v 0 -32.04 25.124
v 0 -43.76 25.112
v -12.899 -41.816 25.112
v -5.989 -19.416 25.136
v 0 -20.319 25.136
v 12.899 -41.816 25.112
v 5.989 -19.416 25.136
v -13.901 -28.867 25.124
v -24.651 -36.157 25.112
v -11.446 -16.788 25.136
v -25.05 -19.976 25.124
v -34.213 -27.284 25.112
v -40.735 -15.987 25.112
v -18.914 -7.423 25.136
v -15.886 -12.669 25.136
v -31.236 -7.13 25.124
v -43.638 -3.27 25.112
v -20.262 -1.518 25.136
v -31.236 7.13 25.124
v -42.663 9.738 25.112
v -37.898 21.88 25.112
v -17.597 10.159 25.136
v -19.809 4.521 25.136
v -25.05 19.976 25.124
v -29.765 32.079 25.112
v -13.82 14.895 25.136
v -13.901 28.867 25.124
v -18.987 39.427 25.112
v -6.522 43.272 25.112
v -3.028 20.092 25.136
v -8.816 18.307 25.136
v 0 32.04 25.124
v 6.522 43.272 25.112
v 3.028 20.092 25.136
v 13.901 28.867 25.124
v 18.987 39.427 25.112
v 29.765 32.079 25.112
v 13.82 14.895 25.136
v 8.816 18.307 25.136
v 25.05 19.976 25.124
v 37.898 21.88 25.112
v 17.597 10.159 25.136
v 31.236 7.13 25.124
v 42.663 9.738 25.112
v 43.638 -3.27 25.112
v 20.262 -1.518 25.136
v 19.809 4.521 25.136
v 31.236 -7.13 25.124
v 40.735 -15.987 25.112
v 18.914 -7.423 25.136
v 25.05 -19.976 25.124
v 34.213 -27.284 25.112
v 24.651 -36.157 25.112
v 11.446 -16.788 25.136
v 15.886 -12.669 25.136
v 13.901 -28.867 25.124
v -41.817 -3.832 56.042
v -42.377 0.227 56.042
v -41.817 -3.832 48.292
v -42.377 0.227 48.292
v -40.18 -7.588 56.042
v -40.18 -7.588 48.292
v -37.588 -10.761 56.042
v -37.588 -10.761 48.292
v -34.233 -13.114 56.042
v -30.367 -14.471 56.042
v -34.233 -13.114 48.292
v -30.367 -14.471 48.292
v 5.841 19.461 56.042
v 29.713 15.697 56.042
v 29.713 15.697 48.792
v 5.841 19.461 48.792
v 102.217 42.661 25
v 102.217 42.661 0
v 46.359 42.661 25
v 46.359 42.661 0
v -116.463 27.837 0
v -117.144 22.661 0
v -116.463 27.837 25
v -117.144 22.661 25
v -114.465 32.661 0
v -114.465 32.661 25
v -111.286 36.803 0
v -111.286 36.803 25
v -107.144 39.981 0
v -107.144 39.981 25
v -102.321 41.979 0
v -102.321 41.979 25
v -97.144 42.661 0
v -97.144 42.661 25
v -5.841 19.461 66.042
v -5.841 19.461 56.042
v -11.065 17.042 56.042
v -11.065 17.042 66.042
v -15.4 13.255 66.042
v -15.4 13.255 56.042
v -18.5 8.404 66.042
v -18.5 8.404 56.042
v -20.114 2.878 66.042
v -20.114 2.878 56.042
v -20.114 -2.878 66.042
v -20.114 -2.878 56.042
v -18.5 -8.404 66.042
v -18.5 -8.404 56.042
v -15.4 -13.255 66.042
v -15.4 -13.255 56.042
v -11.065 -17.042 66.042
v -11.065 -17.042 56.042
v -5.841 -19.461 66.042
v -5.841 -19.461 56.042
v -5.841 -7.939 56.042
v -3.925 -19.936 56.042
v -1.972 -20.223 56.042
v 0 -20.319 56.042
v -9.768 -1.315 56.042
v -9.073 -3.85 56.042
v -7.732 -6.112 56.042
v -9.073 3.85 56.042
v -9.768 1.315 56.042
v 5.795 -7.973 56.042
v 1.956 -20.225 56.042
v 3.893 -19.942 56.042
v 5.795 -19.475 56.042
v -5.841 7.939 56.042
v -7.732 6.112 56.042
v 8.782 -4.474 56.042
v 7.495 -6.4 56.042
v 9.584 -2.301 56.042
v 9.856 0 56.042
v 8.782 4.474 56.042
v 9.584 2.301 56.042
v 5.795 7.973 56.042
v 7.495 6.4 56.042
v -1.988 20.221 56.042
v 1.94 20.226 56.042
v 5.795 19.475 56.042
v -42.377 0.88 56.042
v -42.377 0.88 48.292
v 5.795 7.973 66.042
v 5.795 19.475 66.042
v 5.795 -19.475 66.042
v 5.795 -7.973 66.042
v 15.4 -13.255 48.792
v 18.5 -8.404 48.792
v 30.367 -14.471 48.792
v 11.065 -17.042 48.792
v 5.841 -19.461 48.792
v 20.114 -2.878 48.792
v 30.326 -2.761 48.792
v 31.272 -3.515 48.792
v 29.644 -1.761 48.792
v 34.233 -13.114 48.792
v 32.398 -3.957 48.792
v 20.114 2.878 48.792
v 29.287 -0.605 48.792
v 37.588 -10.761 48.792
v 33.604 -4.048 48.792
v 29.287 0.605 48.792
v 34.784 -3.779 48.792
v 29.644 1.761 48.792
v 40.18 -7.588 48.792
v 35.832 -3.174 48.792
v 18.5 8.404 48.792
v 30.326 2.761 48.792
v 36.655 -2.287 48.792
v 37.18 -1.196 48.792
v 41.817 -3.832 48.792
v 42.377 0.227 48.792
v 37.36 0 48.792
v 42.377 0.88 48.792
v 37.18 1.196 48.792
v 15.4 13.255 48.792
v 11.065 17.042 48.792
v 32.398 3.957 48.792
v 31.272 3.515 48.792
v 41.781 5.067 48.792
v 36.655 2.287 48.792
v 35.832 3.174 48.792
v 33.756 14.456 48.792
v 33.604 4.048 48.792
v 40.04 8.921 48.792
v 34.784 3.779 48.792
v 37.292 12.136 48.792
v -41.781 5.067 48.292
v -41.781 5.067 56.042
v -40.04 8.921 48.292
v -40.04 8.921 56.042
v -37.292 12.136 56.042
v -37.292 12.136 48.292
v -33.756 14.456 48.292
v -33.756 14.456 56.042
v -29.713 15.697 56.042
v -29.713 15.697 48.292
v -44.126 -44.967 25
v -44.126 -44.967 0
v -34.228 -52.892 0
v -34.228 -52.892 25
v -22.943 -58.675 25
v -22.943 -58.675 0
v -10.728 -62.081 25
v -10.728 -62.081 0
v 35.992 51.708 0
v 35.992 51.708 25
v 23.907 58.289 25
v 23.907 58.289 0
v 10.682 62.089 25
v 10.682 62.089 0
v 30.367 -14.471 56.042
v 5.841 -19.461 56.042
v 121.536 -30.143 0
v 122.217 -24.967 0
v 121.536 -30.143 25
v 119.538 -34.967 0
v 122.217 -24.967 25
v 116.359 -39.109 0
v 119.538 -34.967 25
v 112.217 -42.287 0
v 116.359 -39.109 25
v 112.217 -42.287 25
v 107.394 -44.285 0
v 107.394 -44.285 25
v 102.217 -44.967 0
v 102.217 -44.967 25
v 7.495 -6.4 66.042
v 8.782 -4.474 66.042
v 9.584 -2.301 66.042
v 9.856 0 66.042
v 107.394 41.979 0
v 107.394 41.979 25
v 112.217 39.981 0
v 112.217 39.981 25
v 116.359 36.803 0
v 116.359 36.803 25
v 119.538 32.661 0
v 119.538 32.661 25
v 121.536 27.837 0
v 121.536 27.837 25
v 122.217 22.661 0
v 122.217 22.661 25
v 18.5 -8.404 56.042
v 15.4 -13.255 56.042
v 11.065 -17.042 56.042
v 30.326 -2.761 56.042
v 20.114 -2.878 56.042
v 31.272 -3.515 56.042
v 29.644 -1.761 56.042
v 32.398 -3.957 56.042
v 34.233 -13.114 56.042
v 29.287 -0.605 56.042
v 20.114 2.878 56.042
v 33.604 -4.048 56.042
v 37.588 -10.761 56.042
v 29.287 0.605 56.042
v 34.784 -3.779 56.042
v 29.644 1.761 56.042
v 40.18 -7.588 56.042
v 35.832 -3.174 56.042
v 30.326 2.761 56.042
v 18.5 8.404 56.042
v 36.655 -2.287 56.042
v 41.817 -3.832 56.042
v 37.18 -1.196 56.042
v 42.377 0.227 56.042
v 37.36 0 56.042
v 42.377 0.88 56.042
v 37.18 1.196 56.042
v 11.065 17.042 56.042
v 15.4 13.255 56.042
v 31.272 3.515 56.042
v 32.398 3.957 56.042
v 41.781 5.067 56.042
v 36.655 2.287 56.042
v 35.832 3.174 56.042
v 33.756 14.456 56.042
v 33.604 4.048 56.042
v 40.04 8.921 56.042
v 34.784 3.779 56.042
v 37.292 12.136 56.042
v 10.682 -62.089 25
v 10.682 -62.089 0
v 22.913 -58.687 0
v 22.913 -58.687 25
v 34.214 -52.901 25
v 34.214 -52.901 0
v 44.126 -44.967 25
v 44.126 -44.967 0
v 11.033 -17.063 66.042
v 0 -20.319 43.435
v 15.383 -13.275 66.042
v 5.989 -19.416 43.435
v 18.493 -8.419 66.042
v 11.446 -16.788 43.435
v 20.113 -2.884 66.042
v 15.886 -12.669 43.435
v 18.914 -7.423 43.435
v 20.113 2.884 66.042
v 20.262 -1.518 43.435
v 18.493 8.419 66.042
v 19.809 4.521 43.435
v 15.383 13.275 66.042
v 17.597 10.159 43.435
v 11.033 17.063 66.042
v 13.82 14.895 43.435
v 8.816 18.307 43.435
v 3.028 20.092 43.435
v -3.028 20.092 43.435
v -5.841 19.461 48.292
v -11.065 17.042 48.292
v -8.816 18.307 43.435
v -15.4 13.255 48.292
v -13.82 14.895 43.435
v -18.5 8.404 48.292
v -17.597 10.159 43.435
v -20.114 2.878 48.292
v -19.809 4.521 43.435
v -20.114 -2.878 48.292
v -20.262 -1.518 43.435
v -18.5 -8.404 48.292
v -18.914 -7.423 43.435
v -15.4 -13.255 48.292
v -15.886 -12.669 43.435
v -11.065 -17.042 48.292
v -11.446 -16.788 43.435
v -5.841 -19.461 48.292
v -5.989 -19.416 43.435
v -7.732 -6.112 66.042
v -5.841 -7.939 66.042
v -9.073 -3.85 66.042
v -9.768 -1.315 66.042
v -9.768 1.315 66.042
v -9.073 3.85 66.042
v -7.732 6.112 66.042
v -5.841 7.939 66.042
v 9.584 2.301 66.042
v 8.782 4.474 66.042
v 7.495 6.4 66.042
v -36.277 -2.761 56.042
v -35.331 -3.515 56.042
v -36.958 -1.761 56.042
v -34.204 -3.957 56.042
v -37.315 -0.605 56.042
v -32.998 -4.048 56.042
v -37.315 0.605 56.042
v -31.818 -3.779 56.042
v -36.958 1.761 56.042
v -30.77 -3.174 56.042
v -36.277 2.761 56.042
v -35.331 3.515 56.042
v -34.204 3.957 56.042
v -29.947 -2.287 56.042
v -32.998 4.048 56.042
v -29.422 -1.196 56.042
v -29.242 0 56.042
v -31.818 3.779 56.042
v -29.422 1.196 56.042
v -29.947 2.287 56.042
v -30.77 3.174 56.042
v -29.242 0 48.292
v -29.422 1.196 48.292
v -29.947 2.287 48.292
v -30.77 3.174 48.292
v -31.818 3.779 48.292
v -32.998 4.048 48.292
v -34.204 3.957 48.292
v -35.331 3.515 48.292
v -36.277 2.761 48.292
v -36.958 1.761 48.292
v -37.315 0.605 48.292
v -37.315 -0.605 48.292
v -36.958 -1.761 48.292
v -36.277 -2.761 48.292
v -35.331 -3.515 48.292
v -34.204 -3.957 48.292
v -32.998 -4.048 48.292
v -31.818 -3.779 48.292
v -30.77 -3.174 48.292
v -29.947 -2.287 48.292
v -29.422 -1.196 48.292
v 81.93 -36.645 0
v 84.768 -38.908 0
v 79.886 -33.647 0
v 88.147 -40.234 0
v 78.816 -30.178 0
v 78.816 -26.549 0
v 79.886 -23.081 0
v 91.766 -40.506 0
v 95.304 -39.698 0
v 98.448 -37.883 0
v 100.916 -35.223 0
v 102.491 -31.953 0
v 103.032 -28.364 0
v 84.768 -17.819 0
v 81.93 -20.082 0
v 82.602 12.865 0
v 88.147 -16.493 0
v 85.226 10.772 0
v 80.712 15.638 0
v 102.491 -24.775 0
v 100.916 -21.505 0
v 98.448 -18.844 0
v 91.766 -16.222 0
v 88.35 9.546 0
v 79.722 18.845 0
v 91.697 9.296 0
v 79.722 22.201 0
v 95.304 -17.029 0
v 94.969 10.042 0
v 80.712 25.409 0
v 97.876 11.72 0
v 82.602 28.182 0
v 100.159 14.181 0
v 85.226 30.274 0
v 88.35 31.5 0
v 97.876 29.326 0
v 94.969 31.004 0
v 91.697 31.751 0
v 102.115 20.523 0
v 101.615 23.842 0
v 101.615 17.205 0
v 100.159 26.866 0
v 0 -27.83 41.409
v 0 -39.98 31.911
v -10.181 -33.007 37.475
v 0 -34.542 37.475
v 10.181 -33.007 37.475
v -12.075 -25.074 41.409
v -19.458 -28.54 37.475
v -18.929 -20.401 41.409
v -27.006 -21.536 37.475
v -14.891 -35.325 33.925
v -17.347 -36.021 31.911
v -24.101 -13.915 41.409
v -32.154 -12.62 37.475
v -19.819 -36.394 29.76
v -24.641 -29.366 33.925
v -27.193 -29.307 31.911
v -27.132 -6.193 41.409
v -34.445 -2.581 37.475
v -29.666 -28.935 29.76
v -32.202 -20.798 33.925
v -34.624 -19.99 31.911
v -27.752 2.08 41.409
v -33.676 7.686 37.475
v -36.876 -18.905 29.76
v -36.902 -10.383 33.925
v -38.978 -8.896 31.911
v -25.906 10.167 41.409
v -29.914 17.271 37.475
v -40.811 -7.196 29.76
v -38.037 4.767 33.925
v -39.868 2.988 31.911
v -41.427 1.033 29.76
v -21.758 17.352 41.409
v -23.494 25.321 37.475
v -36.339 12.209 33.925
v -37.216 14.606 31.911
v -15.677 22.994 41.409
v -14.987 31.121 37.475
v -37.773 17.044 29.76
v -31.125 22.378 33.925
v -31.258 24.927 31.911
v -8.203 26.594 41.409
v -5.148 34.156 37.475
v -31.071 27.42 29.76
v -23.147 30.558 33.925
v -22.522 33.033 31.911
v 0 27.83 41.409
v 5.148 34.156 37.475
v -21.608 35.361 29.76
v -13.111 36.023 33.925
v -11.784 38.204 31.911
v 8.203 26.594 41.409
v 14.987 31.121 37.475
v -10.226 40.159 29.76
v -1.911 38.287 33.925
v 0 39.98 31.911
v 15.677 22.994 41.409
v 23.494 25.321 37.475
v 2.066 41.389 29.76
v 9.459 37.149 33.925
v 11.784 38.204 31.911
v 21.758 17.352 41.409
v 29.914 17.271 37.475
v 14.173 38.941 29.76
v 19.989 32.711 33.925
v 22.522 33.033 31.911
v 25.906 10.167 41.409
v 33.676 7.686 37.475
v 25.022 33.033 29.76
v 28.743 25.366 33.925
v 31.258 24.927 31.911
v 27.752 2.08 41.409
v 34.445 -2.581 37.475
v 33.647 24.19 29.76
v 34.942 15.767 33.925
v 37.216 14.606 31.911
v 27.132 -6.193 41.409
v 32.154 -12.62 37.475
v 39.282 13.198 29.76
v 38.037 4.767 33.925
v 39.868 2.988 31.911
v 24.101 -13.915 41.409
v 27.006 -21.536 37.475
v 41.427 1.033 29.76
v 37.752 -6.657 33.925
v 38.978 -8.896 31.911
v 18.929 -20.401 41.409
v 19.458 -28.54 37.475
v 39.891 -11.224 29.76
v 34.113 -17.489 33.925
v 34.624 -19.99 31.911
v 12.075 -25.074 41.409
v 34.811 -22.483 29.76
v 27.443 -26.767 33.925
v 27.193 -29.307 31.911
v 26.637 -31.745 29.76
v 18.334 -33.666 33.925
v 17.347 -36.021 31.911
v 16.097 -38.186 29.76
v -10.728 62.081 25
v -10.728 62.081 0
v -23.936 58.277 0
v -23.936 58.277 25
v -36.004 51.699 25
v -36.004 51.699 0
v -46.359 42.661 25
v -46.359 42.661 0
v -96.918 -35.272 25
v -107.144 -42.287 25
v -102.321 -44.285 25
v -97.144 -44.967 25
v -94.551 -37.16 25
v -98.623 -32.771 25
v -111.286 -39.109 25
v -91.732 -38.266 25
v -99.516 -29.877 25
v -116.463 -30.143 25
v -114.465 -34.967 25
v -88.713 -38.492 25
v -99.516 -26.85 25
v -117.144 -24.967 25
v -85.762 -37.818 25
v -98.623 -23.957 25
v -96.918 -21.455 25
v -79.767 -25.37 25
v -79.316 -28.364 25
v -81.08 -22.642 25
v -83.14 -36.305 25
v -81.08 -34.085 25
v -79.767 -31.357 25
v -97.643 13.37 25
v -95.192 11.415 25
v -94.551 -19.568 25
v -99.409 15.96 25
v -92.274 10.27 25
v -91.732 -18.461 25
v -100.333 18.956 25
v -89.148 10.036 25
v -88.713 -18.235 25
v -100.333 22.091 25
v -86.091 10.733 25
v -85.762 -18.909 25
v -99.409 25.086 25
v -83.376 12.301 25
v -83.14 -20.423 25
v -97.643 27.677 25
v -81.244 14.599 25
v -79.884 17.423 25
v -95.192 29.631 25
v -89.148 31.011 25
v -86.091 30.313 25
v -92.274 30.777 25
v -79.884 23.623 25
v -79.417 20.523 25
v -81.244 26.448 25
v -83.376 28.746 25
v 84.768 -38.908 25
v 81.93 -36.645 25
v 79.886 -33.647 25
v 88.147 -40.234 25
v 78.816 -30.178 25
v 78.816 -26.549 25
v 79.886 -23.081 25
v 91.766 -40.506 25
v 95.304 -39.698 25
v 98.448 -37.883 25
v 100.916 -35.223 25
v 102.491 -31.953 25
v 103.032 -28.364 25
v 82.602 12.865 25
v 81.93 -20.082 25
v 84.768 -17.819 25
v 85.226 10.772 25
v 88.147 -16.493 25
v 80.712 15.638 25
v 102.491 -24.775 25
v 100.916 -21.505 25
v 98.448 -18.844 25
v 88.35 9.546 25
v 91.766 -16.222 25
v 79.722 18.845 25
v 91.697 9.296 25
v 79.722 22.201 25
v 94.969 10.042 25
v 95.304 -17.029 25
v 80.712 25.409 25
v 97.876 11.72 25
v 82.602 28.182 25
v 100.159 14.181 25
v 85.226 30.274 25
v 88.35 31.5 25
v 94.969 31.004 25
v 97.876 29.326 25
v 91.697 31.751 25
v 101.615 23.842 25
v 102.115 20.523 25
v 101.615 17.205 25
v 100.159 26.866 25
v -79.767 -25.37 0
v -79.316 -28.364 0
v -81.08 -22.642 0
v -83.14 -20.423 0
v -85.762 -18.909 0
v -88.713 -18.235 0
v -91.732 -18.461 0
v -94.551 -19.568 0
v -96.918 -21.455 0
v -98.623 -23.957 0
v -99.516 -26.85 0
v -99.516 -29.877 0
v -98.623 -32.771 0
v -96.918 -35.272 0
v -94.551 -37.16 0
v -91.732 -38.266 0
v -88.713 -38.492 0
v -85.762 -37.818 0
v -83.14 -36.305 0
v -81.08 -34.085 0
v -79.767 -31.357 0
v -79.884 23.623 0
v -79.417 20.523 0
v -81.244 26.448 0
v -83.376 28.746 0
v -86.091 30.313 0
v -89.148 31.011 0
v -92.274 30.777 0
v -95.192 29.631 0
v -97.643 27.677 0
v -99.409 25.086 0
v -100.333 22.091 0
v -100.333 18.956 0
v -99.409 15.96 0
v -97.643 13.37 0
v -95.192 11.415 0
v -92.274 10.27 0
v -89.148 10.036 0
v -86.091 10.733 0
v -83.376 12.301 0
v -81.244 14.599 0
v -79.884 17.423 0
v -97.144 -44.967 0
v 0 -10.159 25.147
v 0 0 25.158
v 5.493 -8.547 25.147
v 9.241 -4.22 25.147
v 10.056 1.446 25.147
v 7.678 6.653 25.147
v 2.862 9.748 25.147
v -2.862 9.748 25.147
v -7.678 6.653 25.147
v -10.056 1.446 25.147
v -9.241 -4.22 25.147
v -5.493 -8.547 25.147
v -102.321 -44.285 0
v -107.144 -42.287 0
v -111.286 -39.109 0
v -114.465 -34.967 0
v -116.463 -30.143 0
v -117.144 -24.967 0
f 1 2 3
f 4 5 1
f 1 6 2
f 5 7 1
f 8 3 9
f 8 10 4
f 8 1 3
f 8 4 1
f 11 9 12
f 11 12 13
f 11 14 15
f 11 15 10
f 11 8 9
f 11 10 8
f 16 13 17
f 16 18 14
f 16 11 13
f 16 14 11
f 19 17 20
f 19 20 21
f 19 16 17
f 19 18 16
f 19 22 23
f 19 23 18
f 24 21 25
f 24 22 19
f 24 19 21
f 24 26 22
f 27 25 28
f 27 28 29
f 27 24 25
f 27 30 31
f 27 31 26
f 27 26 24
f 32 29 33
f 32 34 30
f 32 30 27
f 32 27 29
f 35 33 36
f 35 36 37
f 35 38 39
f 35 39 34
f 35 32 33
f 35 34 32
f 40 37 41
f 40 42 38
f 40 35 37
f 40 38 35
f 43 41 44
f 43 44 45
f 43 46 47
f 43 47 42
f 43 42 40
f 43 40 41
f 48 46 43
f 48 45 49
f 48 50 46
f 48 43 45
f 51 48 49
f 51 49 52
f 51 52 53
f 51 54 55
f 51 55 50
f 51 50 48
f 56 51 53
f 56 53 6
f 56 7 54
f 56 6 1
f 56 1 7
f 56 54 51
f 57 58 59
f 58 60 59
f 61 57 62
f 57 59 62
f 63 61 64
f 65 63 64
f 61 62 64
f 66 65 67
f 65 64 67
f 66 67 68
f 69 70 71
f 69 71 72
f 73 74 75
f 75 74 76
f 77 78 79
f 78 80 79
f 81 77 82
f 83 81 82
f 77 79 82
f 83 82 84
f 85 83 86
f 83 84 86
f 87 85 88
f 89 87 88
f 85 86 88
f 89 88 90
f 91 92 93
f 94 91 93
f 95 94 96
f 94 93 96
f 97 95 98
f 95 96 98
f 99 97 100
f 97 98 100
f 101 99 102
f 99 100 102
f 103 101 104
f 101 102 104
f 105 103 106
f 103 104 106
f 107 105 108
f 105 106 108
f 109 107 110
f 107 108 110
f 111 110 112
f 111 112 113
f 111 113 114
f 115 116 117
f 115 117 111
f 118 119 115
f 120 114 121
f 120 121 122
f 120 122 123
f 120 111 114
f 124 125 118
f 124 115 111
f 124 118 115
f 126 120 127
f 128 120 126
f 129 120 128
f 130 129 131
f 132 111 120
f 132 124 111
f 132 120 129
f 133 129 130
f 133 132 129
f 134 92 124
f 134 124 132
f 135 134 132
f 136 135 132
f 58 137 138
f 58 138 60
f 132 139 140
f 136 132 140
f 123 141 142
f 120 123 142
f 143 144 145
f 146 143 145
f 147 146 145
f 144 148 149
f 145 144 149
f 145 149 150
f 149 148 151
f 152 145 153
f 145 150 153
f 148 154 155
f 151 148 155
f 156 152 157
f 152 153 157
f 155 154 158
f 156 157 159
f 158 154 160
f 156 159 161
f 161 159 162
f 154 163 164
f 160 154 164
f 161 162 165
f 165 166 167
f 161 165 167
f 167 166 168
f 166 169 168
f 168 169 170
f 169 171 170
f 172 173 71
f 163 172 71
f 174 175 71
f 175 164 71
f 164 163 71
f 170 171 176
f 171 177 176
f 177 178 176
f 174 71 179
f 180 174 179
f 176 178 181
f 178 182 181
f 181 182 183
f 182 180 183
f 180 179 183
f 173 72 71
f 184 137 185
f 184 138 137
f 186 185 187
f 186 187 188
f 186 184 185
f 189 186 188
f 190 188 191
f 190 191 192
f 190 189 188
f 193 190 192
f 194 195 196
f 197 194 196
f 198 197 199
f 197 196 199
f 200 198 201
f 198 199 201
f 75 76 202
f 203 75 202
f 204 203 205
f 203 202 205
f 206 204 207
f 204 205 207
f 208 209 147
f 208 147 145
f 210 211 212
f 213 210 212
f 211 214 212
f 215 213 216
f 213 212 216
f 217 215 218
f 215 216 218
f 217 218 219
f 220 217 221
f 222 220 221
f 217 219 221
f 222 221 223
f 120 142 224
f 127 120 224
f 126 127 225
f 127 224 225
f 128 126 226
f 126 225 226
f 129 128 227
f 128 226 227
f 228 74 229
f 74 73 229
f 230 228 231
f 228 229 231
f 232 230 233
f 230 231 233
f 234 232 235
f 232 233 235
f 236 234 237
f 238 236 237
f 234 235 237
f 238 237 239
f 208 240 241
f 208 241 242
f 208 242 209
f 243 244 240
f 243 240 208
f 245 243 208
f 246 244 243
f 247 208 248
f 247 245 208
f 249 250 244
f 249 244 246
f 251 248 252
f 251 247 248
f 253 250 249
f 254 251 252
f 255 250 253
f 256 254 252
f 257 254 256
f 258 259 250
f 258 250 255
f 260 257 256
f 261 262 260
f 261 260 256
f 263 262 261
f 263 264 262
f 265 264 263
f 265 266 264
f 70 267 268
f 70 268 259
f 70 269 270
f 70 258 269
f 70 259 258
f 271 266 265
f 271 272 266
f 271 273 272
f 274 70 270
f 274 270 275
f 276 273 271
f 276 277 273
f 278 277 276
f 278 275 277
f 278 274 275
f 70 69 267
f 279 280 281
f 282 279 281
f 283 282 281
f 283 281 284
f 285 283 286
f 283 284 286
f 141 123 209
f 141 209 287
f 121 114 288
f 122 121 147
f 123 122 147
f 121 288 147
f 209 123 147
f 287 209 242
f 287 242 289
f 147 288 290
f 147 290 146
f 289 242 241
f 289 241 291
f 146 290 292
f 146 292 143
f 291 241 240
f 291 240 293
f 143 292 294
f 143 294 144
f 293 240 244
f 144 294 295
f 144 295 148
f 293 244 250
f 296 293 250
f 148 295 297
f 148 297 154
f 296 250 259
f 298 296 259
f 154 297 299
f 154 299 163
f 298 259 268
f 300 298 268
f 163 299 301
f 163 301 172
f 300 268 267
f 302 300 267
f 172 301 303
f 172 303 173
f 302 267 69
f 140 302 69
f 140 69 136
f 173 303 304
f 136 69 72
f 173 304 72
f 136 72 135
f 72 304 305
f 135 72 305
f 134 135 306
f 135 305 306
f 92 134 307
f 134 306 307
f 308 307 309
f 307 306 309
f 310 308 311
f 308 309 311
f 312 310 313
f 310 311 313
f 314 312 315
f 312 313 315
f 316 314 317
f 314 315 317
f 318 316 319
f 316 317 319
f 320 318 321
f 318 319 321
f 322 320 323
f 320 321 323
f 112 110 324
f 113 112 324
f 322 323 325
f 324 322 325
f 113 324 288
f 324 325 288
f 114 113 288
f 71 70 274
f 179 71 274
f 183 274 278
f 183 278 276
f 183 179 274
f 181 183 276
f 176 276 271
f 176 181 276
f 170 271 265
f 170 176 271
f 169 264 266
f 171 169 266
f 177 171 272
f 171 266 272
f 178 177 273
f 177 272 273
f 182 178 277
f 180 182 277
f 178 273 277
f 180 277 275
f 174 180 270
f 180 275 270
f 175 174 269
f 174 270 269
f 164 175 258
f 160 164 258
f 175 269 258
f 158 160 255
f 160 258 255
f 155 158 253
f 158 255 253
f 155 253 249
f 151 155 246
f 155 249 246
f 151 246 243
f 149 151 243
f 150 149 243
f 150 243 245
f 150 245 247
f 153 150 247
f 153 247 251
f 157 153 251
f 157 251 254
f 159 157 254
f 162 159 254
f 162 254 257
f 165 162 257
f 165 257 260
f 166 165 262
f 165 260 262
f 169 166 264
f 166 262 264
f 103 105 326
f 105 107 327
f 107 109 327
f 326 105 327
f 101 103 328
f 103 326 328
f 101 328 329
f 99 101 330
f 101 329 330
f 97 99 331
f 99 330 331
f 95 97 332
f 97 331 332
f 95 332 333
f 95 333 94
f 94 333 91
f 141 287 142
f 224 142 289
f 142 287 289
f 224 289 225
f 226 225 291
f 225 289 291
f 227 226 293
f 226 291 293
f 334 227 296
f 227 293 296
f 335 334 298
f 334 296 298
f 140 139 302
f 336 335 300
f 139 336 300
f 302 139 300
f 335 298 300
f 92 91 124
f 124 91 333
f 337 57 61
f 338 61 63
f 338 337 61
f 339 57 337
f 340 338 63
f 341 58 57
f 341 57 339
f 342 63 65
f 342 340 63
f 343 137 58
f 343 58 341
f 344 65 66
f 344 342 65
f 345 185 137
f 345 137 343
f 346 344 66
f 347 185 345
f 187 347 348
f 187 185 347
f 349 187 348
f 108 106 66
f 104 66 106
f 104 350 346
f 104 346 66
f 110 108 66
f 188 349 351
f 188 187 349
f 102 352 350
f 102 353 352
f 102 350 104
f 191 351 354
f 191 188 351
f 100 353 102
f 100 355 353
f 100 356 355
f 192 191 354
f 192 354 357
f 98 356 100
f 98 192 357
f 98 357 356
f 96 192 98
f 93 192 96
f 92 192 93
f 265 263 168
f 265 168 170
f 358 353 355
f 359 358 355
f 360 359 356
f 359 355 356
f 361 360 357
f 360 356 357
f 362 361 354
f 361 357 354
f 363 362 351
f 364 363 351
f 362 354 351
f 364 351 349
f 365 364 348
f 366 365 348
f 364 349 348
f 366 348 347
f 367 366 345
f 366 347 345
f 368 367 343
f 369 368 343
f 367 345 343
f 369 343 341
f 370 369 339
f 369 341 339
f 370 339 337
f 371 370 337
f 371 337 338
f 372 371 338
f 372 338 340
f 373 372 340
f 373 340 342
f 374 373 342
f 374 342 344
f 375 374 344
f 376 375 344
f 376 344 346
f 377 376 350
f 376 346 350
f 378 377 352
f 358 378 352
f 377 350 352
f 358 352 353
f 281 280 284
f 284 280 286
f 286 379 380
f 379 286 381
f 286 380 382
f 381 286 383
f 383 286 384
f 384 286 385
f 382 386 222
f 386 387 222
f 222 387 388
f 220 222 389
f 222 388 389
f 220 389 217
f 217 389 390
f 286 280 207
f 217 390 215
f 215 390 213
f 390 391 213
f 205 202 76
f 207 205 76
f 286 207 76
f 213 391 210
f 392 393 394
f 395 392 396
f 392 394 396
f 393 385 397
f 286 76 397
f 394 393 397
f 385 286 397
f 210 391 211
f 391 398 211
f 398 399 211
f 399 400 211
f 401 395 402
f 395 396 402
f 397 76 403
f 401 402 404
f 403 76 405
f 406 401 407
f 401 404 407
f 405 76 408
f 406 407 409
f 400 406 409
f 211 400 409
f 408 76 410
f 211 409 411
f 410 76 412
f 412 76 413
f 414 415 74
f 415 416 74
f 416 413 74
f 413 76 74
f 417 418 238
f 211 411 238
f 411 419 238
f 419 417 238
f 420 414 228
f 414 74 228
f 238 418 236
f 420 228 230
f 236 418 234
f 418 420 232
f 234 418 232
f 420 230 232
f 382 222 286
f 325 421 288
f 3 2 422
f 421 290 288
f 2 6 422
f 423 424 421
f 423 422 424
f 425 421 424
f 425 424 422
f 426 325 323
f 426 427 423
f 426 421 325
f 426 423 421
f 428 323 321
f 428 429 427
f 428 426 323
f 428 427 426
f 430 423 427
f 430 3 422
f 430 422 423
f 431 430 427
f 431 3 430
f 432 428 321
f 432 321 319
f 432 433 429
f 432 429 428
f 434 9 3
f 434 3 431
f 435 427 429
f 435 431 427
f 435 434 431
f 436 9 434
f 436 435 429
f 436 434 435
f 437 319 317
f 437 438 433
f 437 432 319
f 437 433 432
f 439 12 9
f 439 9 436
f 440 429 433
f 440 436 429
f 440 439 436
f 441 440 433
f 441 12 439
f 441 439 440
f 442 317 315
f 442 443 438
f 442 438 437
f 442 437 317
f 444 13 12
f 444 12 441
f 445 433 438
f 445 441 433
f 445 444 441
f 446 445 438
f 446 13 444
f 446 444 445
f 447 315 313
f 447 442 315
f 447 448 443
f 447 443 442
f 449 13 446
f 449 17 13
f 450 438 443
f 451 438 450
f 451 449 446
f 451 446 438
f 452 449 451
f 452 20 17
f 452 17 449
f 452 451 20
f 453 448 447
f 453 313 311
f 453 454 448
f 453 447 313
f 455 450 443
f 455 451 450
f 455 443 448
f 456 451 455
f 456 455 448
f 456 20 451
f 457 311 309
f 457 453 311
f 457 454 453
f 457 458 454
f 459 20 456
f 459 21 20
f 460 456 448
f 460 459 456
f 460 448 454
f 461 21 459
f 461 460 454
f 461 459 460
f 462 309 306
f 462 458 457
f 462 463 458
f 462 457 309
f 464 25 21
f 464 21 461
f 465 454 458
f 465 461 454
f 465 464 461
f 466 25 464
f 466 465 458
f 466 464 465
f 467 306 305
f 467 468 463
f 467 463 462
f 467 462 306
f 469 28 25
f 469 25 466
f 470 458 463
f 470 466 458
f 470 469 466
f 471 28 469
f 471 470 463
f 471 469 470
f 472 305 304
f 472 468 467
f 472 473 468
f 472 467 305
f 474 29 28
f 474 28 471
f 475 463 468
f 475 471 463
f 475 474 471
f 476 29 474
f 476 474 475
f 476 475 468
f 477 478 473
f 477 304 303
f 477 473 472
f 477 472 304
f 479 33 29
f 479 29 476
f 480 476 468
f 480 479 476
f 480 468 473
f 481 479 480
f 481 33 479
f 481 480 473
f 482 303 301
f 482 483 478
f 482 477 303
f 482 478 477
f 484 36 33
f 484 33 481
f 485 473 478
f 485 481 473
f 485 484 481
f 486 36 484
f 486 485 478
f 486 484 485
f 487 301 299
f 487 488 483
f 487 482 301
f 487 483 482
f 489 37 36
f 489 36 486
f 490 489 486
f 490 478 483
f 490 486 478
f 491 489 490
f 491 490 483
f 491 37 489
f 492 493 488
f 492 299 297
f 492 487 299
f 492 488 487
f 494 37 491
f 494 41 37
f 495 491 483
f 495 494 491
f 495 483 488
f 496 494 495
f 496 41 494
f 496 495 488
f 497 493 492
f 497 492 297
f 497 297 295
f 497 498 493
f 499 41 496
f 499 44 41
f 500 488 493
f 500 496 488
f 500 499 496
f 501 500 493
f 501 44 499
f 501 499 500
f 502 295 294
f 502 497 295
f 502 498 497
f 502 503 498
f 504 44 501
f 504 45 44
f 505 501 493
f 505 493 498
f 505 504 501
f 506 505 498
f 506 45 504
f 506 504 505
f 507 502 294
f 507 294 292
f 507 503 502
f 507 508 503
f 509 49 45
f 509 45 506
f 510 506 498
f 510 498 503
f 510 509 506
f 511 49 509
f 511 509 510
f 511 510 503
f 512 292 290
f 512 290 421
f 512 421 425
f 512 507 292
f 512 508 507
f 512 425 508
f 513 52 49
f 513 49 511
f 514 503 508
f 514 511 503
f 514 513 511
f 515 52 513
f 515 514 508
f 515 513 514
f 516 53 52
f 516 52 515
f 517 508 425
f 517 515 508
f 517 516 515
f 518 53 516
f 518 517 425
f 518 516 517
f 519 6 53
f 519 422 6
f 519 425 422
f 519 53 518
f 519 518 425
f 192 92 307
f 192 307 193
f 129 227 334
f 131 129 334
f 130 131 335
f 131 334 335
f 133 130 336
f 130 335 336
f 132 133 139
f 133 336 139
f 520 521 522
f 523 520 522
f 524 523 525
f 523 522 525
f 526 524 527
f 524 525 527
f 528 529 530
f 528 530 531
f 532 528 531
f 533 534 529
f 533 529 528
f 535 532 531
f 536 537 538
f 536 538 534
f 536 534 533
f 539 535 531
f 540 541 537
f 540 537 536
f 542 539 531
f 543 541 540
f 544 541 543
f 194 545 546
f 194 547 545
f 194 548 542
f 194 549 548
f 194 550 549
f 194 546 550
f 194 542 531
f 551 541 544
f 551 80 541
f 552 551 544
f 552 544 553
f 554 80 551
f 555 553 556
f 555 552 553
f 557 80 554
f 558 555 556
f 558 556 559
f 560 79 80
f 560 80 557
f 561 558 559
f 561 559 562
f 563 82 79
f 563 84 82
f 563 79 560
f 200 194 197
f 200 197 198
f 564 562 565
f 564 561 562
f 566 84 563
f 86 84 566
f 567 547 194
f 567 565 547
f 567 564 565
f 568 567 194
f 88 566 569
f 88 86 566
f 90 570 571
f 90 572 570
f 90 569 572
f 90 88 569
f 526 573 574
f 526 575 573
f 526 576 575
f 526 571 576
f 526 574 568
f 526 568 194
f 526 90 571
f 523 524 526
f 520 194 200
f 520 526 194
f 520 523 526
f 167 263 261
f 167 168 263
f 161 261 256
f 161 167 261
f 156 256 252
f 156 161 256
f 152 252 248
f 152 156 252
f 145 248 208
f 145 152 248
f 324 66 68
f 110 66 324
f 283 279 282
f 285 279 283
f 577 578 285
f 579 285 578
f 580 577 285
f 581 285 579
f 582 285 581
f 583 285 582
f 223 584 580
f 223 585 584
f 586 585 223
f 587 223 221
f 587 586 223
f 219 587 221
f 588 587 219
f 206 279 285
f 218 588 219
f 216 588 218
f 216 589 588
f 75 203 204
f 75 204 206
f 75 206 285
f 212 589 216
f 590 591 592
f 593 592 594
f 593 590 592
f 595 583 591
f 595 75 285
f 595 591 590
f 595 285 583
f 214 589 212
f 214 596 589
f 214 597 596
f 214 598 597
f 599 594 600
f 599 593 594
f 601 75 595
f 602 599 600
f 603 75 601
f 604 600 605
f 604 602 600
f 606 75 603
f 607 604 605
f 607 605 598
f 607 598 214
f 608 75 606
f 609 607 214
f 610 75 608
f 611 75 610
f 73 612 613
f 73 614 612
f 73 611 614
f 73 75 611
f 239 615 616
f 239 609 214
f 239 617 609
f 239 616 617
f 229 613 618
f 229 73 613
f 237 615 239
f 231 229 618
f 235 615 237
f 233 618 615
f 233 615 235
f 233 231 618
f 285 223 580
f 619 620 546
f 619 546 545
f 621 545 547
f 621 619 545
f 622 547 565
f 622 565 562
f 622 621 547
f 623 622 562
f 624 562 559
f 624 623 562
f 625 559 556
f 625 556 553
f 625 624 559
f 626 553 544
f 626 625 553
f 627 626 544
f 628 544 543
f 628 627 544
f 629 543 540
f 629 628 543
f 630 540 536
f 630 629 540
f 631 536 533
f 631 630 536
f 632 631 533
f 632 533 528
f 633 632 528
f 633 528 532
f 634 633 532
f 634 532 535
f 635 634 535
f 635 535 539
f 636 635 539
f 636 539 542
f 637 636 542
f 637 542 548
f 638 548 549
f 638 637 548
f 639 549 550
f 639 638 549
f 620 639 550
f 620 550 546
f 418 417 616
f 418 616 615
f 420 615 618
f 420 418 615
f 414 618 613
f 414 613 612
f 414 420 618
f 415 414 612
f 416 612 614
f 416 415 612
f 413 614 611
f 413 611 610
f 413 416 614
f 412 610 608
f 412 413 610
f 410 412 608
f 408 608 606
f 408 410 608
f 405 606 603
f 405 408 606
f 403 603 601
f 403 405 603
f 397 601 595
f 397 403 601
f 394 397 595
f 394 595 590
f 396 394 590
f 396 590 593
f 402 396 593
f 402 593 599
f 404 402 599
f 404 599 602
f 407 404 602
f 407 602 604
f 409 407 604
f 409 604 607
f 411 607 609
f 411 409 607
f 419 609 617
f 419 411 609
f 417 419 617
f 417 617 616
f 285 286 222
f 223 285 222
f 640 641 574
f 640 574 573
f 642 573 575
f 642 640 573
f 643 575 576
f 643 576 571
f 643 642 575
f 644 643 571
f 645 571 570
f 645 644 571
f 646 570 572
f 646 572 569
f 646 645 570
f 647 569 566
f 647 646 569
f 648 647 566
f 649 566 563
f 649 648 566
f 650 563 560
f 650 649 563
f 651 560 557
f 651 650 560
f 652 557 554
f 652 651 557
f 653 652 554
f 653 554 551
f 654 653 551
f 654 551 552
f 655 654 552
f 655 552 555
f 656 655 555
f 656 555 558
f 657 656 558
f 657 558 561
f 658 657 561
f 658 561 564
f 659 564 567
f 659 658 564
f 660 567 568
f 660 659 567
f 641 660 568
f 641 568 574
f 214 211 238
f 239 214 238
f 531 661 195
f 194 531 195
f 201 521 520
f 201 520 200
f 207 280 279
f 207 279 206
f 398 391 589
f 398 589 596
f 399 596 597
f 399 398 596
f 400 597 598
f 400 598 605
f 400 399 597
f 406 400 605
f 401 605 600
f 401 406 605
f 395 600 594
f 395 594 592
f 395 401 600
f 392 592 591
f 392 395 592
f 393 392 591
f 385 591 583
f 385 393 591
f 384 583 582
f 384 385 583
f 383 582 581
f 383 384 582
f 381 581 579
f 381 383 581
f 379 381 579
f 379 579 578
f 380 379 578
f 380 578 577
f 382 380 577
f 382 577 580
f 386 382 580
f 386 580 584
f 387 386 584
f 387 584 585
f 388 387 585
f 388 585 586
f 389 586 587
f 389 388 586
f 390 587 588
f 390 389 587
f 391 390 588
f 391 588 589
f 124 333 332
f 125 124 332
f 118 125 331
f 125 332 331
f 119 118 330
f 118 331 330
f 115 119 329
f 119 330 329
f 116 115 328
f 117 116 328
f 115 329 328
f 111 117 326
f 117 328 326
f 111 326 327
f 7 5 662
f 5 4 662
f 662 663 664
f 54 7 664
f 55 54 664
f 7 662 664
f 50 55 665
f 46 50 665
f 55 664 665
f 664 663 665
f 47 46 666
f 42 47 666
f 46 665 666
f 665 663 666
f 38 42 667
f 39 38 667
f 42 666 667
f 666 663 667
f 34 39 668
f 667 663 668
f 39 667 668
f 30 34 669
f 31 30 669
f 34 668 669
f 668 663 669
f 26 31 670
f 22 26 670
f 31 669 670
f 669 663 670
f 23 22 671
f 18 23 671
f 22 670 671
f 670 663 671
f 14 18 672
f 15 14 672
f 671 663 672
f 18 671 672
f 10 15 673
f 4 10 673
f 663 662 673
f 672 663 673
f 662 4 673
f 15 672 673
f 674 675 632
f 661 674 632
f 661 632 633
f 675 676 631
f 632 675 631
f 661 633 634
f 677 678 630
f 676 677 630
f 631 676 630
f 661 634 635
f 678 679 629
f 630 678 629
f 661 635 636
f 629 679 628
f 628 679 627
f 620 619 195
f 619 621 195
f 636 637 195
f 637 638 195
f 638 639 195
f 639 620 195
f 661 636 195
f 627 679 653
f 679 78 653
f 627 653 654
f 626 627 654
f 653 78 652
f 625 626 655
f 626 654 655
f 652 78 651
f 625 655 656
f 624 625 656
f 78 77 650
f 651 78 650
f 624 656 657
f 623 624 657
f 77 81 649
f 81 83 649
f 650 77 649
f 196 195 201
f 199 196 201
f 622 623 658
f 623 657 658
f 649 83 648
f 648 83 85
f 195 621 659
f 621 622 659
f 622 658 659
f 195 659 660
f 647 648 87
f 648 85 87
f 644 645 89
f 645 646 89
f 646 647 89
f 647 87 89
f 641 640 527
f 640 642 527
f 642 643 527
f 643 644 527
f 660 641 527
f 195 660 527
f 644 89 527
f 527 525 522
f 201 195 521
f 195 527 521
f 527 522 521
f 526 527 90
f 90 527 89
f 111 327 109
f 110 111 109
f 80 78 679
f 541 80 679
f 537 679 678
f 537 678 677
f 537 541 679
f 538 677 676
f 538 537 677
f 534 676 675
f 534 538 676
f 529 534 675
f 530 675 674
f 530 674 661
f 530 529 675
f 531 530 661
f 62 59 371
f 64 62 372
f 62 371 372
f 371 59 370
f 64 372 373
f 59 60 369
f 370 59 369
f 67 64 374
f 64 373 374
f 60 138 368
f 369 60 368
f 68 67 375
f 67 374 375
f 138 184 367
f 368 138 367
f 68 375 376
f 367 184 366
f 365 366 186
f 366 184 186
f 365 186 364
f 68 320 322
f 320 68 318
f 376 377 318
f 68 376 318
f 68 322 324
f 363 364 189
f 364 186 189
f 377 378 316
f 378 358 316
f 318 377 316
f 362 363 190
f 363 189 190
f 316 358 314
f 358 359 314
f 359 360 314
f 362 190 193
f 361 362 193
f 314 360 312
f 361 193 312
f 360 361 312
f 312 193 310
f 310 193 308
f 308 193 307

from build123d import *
from build123d import SkipClean  # not in build123d's __all__

# Parameters (mm, degrees)
F0_R      = 10.1568223354
F0_R_2    = 10.5169255504
F0_R_3    = 12.1759626717
F0_R_4    = 11.2592738499
F1_DEPTH  = 25
F2_R      = 20
F3_R      = 20
F4_R      = 20
F5_R      = 20
F6_DEPTH  = 84.25
F7_DEPTH  = 100
F8_DEPTH  = 95.25
F9_DEPTH  = 74.75
F14_DEPTH = 10
F15_DEPTH = 10
F16_DEPTH = 10
F17_DEPTH = 10
F18_DEPTH = 10
F19_R     = 4.0591498716
F20_DEPTH = 7.75
F21_R     = 15
F22_R     = 15
F23_DEPTH = 7.25
F24_R     = 15


with BuildPart() as f1:
    # F0 (on Top) → F1 (new body)
    with BuildSketch(Plane.XY):
        with BuildLine():
            Line((-46.3593495633, 42.660780251), (-117.1441823244, 42.660780251))
            Line((-117.1441823244, 42.660780251), (-117.1441823244, -44.9667572975))
            Line((-117.1441823244, -44.9667572975), (-44.1262076515, -44.9667572975))
            ThreePointArc((-44.1262076515, -44.9667572975), (-62.9805950299, -1.6050274871), (-46.3593495633, 42.660780251))
        make_face()
        with Locations((-89.4723236561, -28.3636450768)):
            Circle(F0_R, mode=Mode.SUBTRACT)
        with Locations((-89.9335220456, 20.5232948065)):
            Circle(F0_R_2, mode=Mode.SUBTRACT)
        with BuildLine():
            ThreePointArc((-10.7280304655, 62.0809215934), (-30.1500864357, 55.3182045215), (-46.3593495633, 42.660780251))
            Line((-46.3593495633, 42.660780251), (-10.7280304655, 42.660780251))
            Line((-10.7280304655, 42.660780251), (-10.7280304655, 62.0809215934))
        make_face()
        with BuildLine():
            Line((-10.7280304655, 42.660780251), (-46.3593495633, 42.660780251))
            ThreePointArc((-46.3593495633, 42.660780251), (-62.9805950299, -1.6050274871), (-44.1262076515, -44.9667572975))
            Line((-44.1262076515, -44.9667572975), (-10.7280304655, -44.9667572975))
            Line((-10.7280304655, -44.9667572975), (-10.7280304655, 42.660780251))
        make_face()
        with BuildLine():
            Line((-10.7280304655, 62.0809215934), (-10.7280304655, 42.660780251))
            Line((-10.7280304655, 42.660780251), (10.6815285981, 42.660780251))
            Line((10.6815285981, 42.660780251), (10.6815285981, 62.0889395172))
            ThreePointArc((10.6815285981, 62.0889395172), (-0.0235940182, 63.0010389349), (-10.7280304655, 62.0809215934))
        make_face()
        with BuildLine():
            Line((-10.7280304655, 68.533860147), (-10.7280304655, 62.0809215934))
            ThreePointArc((-10.7280304655, 62.0809215934), (-0.0235940182, 63.0010389349), (10.6815285981, 62.0889395172))
            Line((10.6815285981, 62.0889395172), (10.6815285981, 68.533860147))
            Line((10.6815285981, 68.533860147), (-10.7280304655, 68.533860147))
        make_face()
        with BuildLine():
            Line((-10.7280304655, -44.9667572975), (-44.1262076515, -44.9667572975))
            ThreePointArc((-44.1262076515, -44.9667572975), (-28.7310026755, -56.0683596052), (-10.7280304655, -62.0809215934))
            Line((-10.7280304655, -62.0809215934), (-10.7280304655, -44.9667572975))
        make_face()
        with BuildLine():
            Line((10.6815285981, 62.0889395172), (10.6815285981, 42.660780251))
            Line((10.6815285981, 42.660780251), (46.3593495633, 42.660780251))
            ThreePointArc((46.3593495633, 42.660780251), (30.1293675419, 55.3294919106), (10.6815285981, 62.0889395172))
        make_face()
        with BuildLine():
            Line((46.3593495633, 42.660780251), (10.6815285981, 42.660780251))
            Line((10.6815285981, 42.660780251), (10.6815285981, -44.9667572975))
            Line((10.6815285981, -44.9667572975), (44.1262076515, -44.9667572975))
            ThreePointArc((44.1262076515, -44.9667572975), (58.0910000982, -24.3837480948), (63.0010433529, 0))
            ThreePointArc((63.0010433529, 0), (58.6933507955, 22.8958956137), (46.3593495633, 42.660780251))
        make_face()
        with BuildLine():
            Line((10.6815285981, -44.9667572975), (-10.7280304655, -44.9667572975))
            Line((-10.7280304655, -44.9667572975), (-10.7280304655, -62.0809215934))
            ThreePointArc((-10.7280304655, -62.0809215934), (-0.0235940182, -63.0010389349), (10.6815285981, -62.0889395172))
            Line((10.6815285981, -62.0889395172), (10.6815285981, -44.9667572975))
        make_face()
        with BuildLine():
            ThreePointArc((10.6815285981, -62.0889395172), (-0.0235940182, -63.0010389349), (-10.7280304655, -62.0809215934))
            Line((-10.7280304655, -62.0809215934), (-10.7280304655, -71.3264122605))
            Line((-10.7280304655, -71.3264122605), (10.6815285981, -71.3264122605))
            Line((10.6815285981, -71.3264122605), (10.6815285981, -62.0889395172))
        make_face()
        with BuildLine():
            Line((122.2173571587, 42.660780251), (46.3593495633, 42.660780251))
            ThreePointArc((46.3593495633, 42.660780251), (58.6933507955, 22.8958956137), (63.0010433529, 0))
            ThreePointArc((63.0010433529, 0), (58.0910000982, -24.3837480948), (44.1262076515, -44.9667572975))
            Line((44.1262076515, -44.9667572975), (122.2173571587, -44.9667572975))
            Line((122.2173571587, -44.9667572975), (122.2173571587, 42.660780251))
        make_face()
        with Locations((90.8559188247, -28.3636450768)):
            Circle(F0_R_3, mode=Mode.SUBTRACT)
        with Locations((90.8559188247, 20.5232948065)):
            Circle(F0_R_4, mode=Mode.SUBTRACT)
        with BuildLine():
            Line((44.1262076515, -44.9667572975), (10.6815285981, -44.9667572975))
            Line((10.6815285981, -44.9667572975), (10.6815285981, -62.0889395172))
            ThreePointArc((10.6815285981, -62.0889395172), (28.7100029466, -56.079115492), (44.1262076515, -44.9667572975))
        make_face()
    extrude(amount=F1_DEPTH)

    # F2
    f2_edges = [f1.edges().sort_by_distance(p)[0] for p in [
        (-117.144182, -44.966757, 12.5),
    ]]
    fillet(f2_edges, radius=F2_R)

    # F3
    f3_edges = [f1.edges().sort_by_distance(p)[0] for p in [
        (-117.144182, 42.66078, 12.5),
    ]]
    fillet(f3_edges, radius=F3_R)

    # F4
    f4_edges = [f1.edges().sort_by_distance(p)[0] for p in [
        (122.217357, 42.66078, 12.5),
    ]]
    fillet(f4_edges, radius=F4_R)

    # F5
    f5_edges = [f1.edges().sort_by_distance(p)[0] for p in [
        (122.217357, -44.966757, 12.5),
    ]]
    fillet(f5_edges, radius=F5_R)

    # F0 (on Top) → F6 (cut)
    with BuildSketch(Plane.XY):
        with BuildLine():
            Line((-10.7280304655, 68.533860147), (-10.7280304655, 62.0809215934))
            ThreePointArc((-10.7280304655, 62.0809215934), (-0.0235940182, 63.0010389349), (10.6815285981, 62.0889395172))
            Line((10.6815285981, 62.0889395172), (10.6815285981, 68.533860147))
            Line((10.6815285981, 68.533860147), (-10.7280304655, 68.533860147))
        make_face()
    with SkipClean():  # cleaning this boolean's faces spoils the solid; the shape is the same uncleaned
        extrude(amount=F6_DEPTH, mode=Mode.SUBTRACT)

    # F0 (on Top) → F7 (cut)
    with BuildSketch(Plane.XY):
        with BuildLine():
            Line((-10.7280304655, 62.0809215934), (-10.7280304655, 42.660780251))
            Line((-10.7280304655, 42.660780251), (10.6815285981, 42.660780251))
            Line((10.6815285981, 42.660780251), (10.6815285981, 62.0889395172))
            ThreePointArc((10.6815285981, 62.0889395172), (-0.0235940182, 63.0010389349), (-10.7280304655, 62.0809215934))
        make_face()
    extrude(amount=F7_DEPTH, mode=Mode.SUBTRACT)

    # F0 (on Top) → F8 (cut)
    with BuildSketch(Plane.XY):
        with BuildLine():
            Line((10.6815285981, -44.9667572975), (-10.7280304655, -44.9667572975))
            Line((-10.7280304655, -44.9667572975), (-10.7280304655, -62.0809215934))
            ThreePointArc((-10.7280304655, -62.0809215934), (-0.0235940182, -63.0010389349), (10.6815285981, -62.0889395172))
            Line((10.6815285981, -62.0889395172), (10.6815285981, -44.9667572975))
        make_face()
    extrude(amount=F8_DEPTH, mode=Mode.SUBTRACT)

    # F0 (on Top) → F9 (cut)
    with BuildSketch(Plane.XY):
        with BuildLine():
            ThreePointArc((10.6815285981, -62.0889395172), (-0.0235940182, -63.0010389349), (-10.7280304655, -62.0809215934))
            Line((-10.7280304655, -62.0809215934), (-10.7280304655, -71.3264122605))
            Line((-10.7280304655, -71.3264122605), (10.6815285981, -71.3264122605))
            Line((10.6815285981, -71.3264122605), (10.6815285981, -62.0889395172))
        make_face()
    extrude(amount=F9_DEPTH, mode=Mode.SUBTRACT)


with BuildPart() as f11:
    # F10 (on Right) → F11 (revolve)
    with BuildSketch(Plane.YZ):
        Polygon((-20.3189048916, 25.1363171558), (0, 25.1575894654), (0, 66.0419613123), (-20.3189048916, 66.0419613123), (-20.3189048916, 43.4353500201), align=None)
    revolve(axis=Axis((0, 0, 45.5997753888), (0, 0, 1)))

    # F10 (on Right) → F12 (revolve)
    with BuildSketch(Plane.YZ):
        Polygon((-20.3189048916, 25.1363171558), (0, 25.1575894654), (0, 66.0419613123), (-20.3189048916, 66.0419613123), (-20.3189048916, 43.4353500201), align=None)
        with BuildLine():
            Line((-43.7604690051, 25.1117756655), (-20.3189048916, 25.1363171558))
            Line((-20.3189048916, 25.1363171558), (-20.3189048916, 43.4353500201))
            ThreePointArc((-20.3189048916, 43.4353500201), (-34.5417935809, 37.4745372766), (-43.7604690051, 25.1117756655))
        make_face()
    revolve(axis=Axis((0, 0, 66.0419613123), (0, 0, -1)))

    # F13 (on face) → F14 (cut)
    with BuildSketch(Plane.XY.offset(66.0419613123)):
        with BuildLine():
            Line((5.794562865, -7.9730548393), (5.794562865, 7.9730548393))
            ThreePointArc((5.794562865, 7.9730548393), (-0.028804987, 9.8562534739), (-5.8410661295, 7.9390496118))
            Line((-5.8410661295, 7.9390496118), (-5.8410661295, -7.9390496118))
            ThreePointArc((-5.8410661295, -7.9390496118), (-0.028804987, -9.8562534739), (5.794562865, -7.9730548393))
        make_face()
    extrude(amount=-F14_DEPTH, mode=Mode.SUBTRACT)

    # F13 (on face) → F15 (cut)
    with BuildSketch(Plane.XY.offset(66.0419613123)):
        with BuildLine():
            ThreePointArc((-5.8410661295, 7.9390496118), (-0.028804987, 9.8562534739), (5.794562865, 7.9730548393))
            Line((5.794562865, 7.9730548393), (5.794562865, 19.4751363846))
            ThreePointArc((5.794562865, 19.4751363846), (-0.0242676601, 20.3188903997), (-5.8410661295, 19.4612394894))
            Line((-5.8410661295, 19.4612394894), (-5.8410661295, 7.9390496118))
        make_face()
    extrude(amount=-F15_DEPTH, mode=Mode.SUBTRACT)

    # F13 (on face) → F16 (cut)
    with BuildSketch(Plane.XY.offset(66.0419613123)):
        with BuildLine():
            Line((5.794562865, -19.4751363846), (5.794562865, -7.9730548393))
            ThreePointArc((5.794562865, -7.9730548393), (-0.028804987, -9.8562534739), (-5.8410661295, -7.9390496118))
            Line((-5.8410661295, -7.9390496118), (-5.8410661295, -19.4612394894))
            ThreePointArc((-5.8410661295, -19.4612394894), (-0.0242676601, -20.3188903997), (5.794562865, -19.4751363846))
        make_face()
    extrude(amount=-F16_DEPTH, mode=Mode.SUBTRACT)

    # F13 (on face) → F17 (cut)
    with BuildSketch(Plane.XY.offset(66.0419613123)):
        with BuildLine():
            Line((-5.8410661295, -7.9390496118), (-5.8410661295, 7.9390496118))
            ThreePointArc((-5.8410661295, 7.9390496118), (-9.8562955652, 0), (-5.8410661295, -7.9390496118))
        make_face()
    extrude(amount=-F17_DEPTH, mode=Mode.SUBTRACT)

    # F13 (on face) → F18 (cut)
    with BuildSketch(Plane.XY.offset(66.0419613123)):
        with BuildLine():
            ThreePointArc((5.794562865, -7.9730548393), (8.7823540847, -4.4740159812), (9.8562955652, 0))
            ThreePointArc((9.8562955652, 0), (8.7823540847, 4.4740159812), (5.794562865, 7.9730548393))
            Line((5.794562865, 7.9730548393), (5.794562865, -7.9730548393))
        make_face()
    extrude(amount=-F18_DEPTH, mode=Mode.SUBTRACT)

    # F19 (on face) → F20 (join)
    with BuildSketch(Plane.XY.offset(56.0419613123)):
        with BuildLine():
            Line((-5.8410661295, 7.9390496118), (-5.8410661295, 19.4612394894))
            Line((-5.8410661295, 19.4612394894), (-42.3769466579, 13.7001445506))
            Line((-42.3769466579, 13.7001445506), (-42.3769466579, -12.0281800628))
            Line((-42.3769466579, -12.0281800628), (-5.8410661295, -19.4612394894))
            Line((-5.8410661295, -19.4612394894), (-5.8410661295, -7.9390496118))
            ThreePointArc((-5.8410661295, -7.9390496118), (-9.8562955652, 0), (-5.8410661295, 7.9390496118))
        make_face()
        with Locations((-33.3011560142, 0)):
            Circle(F19_R, mode=Mode.SUBTRACT)
    extrude(amount=-F20_DEPTH)

    # F21
    f21_edges = [f11.edges().sort_by_distance(p)[0] for p in [
        (-42.376947, -12.02818, 52.166961),
    ]]
    fillet(f21_edges, radius=F21_R)

    # F22
    f22_edges = [f11.edges().sort_by_distance(p)[0] for p in [
        (-42.376947, 13.700145, 52.166961),
    ]]
    fillet(f22_edges, radius=F22_R)

    # F19 (on face) → F23 (join)
    with BuildSketch(Plane.XY.offset(56.0419613123)):
        with BuildLine():
            Line((5.8410661295, 19.4612394894), (5.794562865, 7.9730548393))
            ThreePointArc((5.794562865, 7.9730548393), (10.5983419931, 0), (5.794562865, -7.9730548393))
            Line((5.794562865, -7.9730548393), (5.8410661295, -19.4612394894))
            Line((5.8410661295, -19.4612394894), (42.3769466579, -12.0281800628))
            Line((42.3769466579, -12.0281800628), (42.3769466579, 13.7001445506))
            Line((42.3769466579, 13.7001445506), (5.8410661295, 19.4612394894))
        make_face()
        with Locations((33.3011560142, 0)):
            Circle(F19_R, mode=Mode.SUBTRACT)
    extrude(amount=-F23_DEPTH)

    # F24
    f24_edges = [f11.edges().sort_by_distance(p)[0] for p in [
        (42.376947, 13.700145, 52.416961),
        (42.376947, -12.02818, 52.416961),
    ]]
    fillet(f24_edges, radius=F24_R)


solid = Compound([f1.part, f11.part])
